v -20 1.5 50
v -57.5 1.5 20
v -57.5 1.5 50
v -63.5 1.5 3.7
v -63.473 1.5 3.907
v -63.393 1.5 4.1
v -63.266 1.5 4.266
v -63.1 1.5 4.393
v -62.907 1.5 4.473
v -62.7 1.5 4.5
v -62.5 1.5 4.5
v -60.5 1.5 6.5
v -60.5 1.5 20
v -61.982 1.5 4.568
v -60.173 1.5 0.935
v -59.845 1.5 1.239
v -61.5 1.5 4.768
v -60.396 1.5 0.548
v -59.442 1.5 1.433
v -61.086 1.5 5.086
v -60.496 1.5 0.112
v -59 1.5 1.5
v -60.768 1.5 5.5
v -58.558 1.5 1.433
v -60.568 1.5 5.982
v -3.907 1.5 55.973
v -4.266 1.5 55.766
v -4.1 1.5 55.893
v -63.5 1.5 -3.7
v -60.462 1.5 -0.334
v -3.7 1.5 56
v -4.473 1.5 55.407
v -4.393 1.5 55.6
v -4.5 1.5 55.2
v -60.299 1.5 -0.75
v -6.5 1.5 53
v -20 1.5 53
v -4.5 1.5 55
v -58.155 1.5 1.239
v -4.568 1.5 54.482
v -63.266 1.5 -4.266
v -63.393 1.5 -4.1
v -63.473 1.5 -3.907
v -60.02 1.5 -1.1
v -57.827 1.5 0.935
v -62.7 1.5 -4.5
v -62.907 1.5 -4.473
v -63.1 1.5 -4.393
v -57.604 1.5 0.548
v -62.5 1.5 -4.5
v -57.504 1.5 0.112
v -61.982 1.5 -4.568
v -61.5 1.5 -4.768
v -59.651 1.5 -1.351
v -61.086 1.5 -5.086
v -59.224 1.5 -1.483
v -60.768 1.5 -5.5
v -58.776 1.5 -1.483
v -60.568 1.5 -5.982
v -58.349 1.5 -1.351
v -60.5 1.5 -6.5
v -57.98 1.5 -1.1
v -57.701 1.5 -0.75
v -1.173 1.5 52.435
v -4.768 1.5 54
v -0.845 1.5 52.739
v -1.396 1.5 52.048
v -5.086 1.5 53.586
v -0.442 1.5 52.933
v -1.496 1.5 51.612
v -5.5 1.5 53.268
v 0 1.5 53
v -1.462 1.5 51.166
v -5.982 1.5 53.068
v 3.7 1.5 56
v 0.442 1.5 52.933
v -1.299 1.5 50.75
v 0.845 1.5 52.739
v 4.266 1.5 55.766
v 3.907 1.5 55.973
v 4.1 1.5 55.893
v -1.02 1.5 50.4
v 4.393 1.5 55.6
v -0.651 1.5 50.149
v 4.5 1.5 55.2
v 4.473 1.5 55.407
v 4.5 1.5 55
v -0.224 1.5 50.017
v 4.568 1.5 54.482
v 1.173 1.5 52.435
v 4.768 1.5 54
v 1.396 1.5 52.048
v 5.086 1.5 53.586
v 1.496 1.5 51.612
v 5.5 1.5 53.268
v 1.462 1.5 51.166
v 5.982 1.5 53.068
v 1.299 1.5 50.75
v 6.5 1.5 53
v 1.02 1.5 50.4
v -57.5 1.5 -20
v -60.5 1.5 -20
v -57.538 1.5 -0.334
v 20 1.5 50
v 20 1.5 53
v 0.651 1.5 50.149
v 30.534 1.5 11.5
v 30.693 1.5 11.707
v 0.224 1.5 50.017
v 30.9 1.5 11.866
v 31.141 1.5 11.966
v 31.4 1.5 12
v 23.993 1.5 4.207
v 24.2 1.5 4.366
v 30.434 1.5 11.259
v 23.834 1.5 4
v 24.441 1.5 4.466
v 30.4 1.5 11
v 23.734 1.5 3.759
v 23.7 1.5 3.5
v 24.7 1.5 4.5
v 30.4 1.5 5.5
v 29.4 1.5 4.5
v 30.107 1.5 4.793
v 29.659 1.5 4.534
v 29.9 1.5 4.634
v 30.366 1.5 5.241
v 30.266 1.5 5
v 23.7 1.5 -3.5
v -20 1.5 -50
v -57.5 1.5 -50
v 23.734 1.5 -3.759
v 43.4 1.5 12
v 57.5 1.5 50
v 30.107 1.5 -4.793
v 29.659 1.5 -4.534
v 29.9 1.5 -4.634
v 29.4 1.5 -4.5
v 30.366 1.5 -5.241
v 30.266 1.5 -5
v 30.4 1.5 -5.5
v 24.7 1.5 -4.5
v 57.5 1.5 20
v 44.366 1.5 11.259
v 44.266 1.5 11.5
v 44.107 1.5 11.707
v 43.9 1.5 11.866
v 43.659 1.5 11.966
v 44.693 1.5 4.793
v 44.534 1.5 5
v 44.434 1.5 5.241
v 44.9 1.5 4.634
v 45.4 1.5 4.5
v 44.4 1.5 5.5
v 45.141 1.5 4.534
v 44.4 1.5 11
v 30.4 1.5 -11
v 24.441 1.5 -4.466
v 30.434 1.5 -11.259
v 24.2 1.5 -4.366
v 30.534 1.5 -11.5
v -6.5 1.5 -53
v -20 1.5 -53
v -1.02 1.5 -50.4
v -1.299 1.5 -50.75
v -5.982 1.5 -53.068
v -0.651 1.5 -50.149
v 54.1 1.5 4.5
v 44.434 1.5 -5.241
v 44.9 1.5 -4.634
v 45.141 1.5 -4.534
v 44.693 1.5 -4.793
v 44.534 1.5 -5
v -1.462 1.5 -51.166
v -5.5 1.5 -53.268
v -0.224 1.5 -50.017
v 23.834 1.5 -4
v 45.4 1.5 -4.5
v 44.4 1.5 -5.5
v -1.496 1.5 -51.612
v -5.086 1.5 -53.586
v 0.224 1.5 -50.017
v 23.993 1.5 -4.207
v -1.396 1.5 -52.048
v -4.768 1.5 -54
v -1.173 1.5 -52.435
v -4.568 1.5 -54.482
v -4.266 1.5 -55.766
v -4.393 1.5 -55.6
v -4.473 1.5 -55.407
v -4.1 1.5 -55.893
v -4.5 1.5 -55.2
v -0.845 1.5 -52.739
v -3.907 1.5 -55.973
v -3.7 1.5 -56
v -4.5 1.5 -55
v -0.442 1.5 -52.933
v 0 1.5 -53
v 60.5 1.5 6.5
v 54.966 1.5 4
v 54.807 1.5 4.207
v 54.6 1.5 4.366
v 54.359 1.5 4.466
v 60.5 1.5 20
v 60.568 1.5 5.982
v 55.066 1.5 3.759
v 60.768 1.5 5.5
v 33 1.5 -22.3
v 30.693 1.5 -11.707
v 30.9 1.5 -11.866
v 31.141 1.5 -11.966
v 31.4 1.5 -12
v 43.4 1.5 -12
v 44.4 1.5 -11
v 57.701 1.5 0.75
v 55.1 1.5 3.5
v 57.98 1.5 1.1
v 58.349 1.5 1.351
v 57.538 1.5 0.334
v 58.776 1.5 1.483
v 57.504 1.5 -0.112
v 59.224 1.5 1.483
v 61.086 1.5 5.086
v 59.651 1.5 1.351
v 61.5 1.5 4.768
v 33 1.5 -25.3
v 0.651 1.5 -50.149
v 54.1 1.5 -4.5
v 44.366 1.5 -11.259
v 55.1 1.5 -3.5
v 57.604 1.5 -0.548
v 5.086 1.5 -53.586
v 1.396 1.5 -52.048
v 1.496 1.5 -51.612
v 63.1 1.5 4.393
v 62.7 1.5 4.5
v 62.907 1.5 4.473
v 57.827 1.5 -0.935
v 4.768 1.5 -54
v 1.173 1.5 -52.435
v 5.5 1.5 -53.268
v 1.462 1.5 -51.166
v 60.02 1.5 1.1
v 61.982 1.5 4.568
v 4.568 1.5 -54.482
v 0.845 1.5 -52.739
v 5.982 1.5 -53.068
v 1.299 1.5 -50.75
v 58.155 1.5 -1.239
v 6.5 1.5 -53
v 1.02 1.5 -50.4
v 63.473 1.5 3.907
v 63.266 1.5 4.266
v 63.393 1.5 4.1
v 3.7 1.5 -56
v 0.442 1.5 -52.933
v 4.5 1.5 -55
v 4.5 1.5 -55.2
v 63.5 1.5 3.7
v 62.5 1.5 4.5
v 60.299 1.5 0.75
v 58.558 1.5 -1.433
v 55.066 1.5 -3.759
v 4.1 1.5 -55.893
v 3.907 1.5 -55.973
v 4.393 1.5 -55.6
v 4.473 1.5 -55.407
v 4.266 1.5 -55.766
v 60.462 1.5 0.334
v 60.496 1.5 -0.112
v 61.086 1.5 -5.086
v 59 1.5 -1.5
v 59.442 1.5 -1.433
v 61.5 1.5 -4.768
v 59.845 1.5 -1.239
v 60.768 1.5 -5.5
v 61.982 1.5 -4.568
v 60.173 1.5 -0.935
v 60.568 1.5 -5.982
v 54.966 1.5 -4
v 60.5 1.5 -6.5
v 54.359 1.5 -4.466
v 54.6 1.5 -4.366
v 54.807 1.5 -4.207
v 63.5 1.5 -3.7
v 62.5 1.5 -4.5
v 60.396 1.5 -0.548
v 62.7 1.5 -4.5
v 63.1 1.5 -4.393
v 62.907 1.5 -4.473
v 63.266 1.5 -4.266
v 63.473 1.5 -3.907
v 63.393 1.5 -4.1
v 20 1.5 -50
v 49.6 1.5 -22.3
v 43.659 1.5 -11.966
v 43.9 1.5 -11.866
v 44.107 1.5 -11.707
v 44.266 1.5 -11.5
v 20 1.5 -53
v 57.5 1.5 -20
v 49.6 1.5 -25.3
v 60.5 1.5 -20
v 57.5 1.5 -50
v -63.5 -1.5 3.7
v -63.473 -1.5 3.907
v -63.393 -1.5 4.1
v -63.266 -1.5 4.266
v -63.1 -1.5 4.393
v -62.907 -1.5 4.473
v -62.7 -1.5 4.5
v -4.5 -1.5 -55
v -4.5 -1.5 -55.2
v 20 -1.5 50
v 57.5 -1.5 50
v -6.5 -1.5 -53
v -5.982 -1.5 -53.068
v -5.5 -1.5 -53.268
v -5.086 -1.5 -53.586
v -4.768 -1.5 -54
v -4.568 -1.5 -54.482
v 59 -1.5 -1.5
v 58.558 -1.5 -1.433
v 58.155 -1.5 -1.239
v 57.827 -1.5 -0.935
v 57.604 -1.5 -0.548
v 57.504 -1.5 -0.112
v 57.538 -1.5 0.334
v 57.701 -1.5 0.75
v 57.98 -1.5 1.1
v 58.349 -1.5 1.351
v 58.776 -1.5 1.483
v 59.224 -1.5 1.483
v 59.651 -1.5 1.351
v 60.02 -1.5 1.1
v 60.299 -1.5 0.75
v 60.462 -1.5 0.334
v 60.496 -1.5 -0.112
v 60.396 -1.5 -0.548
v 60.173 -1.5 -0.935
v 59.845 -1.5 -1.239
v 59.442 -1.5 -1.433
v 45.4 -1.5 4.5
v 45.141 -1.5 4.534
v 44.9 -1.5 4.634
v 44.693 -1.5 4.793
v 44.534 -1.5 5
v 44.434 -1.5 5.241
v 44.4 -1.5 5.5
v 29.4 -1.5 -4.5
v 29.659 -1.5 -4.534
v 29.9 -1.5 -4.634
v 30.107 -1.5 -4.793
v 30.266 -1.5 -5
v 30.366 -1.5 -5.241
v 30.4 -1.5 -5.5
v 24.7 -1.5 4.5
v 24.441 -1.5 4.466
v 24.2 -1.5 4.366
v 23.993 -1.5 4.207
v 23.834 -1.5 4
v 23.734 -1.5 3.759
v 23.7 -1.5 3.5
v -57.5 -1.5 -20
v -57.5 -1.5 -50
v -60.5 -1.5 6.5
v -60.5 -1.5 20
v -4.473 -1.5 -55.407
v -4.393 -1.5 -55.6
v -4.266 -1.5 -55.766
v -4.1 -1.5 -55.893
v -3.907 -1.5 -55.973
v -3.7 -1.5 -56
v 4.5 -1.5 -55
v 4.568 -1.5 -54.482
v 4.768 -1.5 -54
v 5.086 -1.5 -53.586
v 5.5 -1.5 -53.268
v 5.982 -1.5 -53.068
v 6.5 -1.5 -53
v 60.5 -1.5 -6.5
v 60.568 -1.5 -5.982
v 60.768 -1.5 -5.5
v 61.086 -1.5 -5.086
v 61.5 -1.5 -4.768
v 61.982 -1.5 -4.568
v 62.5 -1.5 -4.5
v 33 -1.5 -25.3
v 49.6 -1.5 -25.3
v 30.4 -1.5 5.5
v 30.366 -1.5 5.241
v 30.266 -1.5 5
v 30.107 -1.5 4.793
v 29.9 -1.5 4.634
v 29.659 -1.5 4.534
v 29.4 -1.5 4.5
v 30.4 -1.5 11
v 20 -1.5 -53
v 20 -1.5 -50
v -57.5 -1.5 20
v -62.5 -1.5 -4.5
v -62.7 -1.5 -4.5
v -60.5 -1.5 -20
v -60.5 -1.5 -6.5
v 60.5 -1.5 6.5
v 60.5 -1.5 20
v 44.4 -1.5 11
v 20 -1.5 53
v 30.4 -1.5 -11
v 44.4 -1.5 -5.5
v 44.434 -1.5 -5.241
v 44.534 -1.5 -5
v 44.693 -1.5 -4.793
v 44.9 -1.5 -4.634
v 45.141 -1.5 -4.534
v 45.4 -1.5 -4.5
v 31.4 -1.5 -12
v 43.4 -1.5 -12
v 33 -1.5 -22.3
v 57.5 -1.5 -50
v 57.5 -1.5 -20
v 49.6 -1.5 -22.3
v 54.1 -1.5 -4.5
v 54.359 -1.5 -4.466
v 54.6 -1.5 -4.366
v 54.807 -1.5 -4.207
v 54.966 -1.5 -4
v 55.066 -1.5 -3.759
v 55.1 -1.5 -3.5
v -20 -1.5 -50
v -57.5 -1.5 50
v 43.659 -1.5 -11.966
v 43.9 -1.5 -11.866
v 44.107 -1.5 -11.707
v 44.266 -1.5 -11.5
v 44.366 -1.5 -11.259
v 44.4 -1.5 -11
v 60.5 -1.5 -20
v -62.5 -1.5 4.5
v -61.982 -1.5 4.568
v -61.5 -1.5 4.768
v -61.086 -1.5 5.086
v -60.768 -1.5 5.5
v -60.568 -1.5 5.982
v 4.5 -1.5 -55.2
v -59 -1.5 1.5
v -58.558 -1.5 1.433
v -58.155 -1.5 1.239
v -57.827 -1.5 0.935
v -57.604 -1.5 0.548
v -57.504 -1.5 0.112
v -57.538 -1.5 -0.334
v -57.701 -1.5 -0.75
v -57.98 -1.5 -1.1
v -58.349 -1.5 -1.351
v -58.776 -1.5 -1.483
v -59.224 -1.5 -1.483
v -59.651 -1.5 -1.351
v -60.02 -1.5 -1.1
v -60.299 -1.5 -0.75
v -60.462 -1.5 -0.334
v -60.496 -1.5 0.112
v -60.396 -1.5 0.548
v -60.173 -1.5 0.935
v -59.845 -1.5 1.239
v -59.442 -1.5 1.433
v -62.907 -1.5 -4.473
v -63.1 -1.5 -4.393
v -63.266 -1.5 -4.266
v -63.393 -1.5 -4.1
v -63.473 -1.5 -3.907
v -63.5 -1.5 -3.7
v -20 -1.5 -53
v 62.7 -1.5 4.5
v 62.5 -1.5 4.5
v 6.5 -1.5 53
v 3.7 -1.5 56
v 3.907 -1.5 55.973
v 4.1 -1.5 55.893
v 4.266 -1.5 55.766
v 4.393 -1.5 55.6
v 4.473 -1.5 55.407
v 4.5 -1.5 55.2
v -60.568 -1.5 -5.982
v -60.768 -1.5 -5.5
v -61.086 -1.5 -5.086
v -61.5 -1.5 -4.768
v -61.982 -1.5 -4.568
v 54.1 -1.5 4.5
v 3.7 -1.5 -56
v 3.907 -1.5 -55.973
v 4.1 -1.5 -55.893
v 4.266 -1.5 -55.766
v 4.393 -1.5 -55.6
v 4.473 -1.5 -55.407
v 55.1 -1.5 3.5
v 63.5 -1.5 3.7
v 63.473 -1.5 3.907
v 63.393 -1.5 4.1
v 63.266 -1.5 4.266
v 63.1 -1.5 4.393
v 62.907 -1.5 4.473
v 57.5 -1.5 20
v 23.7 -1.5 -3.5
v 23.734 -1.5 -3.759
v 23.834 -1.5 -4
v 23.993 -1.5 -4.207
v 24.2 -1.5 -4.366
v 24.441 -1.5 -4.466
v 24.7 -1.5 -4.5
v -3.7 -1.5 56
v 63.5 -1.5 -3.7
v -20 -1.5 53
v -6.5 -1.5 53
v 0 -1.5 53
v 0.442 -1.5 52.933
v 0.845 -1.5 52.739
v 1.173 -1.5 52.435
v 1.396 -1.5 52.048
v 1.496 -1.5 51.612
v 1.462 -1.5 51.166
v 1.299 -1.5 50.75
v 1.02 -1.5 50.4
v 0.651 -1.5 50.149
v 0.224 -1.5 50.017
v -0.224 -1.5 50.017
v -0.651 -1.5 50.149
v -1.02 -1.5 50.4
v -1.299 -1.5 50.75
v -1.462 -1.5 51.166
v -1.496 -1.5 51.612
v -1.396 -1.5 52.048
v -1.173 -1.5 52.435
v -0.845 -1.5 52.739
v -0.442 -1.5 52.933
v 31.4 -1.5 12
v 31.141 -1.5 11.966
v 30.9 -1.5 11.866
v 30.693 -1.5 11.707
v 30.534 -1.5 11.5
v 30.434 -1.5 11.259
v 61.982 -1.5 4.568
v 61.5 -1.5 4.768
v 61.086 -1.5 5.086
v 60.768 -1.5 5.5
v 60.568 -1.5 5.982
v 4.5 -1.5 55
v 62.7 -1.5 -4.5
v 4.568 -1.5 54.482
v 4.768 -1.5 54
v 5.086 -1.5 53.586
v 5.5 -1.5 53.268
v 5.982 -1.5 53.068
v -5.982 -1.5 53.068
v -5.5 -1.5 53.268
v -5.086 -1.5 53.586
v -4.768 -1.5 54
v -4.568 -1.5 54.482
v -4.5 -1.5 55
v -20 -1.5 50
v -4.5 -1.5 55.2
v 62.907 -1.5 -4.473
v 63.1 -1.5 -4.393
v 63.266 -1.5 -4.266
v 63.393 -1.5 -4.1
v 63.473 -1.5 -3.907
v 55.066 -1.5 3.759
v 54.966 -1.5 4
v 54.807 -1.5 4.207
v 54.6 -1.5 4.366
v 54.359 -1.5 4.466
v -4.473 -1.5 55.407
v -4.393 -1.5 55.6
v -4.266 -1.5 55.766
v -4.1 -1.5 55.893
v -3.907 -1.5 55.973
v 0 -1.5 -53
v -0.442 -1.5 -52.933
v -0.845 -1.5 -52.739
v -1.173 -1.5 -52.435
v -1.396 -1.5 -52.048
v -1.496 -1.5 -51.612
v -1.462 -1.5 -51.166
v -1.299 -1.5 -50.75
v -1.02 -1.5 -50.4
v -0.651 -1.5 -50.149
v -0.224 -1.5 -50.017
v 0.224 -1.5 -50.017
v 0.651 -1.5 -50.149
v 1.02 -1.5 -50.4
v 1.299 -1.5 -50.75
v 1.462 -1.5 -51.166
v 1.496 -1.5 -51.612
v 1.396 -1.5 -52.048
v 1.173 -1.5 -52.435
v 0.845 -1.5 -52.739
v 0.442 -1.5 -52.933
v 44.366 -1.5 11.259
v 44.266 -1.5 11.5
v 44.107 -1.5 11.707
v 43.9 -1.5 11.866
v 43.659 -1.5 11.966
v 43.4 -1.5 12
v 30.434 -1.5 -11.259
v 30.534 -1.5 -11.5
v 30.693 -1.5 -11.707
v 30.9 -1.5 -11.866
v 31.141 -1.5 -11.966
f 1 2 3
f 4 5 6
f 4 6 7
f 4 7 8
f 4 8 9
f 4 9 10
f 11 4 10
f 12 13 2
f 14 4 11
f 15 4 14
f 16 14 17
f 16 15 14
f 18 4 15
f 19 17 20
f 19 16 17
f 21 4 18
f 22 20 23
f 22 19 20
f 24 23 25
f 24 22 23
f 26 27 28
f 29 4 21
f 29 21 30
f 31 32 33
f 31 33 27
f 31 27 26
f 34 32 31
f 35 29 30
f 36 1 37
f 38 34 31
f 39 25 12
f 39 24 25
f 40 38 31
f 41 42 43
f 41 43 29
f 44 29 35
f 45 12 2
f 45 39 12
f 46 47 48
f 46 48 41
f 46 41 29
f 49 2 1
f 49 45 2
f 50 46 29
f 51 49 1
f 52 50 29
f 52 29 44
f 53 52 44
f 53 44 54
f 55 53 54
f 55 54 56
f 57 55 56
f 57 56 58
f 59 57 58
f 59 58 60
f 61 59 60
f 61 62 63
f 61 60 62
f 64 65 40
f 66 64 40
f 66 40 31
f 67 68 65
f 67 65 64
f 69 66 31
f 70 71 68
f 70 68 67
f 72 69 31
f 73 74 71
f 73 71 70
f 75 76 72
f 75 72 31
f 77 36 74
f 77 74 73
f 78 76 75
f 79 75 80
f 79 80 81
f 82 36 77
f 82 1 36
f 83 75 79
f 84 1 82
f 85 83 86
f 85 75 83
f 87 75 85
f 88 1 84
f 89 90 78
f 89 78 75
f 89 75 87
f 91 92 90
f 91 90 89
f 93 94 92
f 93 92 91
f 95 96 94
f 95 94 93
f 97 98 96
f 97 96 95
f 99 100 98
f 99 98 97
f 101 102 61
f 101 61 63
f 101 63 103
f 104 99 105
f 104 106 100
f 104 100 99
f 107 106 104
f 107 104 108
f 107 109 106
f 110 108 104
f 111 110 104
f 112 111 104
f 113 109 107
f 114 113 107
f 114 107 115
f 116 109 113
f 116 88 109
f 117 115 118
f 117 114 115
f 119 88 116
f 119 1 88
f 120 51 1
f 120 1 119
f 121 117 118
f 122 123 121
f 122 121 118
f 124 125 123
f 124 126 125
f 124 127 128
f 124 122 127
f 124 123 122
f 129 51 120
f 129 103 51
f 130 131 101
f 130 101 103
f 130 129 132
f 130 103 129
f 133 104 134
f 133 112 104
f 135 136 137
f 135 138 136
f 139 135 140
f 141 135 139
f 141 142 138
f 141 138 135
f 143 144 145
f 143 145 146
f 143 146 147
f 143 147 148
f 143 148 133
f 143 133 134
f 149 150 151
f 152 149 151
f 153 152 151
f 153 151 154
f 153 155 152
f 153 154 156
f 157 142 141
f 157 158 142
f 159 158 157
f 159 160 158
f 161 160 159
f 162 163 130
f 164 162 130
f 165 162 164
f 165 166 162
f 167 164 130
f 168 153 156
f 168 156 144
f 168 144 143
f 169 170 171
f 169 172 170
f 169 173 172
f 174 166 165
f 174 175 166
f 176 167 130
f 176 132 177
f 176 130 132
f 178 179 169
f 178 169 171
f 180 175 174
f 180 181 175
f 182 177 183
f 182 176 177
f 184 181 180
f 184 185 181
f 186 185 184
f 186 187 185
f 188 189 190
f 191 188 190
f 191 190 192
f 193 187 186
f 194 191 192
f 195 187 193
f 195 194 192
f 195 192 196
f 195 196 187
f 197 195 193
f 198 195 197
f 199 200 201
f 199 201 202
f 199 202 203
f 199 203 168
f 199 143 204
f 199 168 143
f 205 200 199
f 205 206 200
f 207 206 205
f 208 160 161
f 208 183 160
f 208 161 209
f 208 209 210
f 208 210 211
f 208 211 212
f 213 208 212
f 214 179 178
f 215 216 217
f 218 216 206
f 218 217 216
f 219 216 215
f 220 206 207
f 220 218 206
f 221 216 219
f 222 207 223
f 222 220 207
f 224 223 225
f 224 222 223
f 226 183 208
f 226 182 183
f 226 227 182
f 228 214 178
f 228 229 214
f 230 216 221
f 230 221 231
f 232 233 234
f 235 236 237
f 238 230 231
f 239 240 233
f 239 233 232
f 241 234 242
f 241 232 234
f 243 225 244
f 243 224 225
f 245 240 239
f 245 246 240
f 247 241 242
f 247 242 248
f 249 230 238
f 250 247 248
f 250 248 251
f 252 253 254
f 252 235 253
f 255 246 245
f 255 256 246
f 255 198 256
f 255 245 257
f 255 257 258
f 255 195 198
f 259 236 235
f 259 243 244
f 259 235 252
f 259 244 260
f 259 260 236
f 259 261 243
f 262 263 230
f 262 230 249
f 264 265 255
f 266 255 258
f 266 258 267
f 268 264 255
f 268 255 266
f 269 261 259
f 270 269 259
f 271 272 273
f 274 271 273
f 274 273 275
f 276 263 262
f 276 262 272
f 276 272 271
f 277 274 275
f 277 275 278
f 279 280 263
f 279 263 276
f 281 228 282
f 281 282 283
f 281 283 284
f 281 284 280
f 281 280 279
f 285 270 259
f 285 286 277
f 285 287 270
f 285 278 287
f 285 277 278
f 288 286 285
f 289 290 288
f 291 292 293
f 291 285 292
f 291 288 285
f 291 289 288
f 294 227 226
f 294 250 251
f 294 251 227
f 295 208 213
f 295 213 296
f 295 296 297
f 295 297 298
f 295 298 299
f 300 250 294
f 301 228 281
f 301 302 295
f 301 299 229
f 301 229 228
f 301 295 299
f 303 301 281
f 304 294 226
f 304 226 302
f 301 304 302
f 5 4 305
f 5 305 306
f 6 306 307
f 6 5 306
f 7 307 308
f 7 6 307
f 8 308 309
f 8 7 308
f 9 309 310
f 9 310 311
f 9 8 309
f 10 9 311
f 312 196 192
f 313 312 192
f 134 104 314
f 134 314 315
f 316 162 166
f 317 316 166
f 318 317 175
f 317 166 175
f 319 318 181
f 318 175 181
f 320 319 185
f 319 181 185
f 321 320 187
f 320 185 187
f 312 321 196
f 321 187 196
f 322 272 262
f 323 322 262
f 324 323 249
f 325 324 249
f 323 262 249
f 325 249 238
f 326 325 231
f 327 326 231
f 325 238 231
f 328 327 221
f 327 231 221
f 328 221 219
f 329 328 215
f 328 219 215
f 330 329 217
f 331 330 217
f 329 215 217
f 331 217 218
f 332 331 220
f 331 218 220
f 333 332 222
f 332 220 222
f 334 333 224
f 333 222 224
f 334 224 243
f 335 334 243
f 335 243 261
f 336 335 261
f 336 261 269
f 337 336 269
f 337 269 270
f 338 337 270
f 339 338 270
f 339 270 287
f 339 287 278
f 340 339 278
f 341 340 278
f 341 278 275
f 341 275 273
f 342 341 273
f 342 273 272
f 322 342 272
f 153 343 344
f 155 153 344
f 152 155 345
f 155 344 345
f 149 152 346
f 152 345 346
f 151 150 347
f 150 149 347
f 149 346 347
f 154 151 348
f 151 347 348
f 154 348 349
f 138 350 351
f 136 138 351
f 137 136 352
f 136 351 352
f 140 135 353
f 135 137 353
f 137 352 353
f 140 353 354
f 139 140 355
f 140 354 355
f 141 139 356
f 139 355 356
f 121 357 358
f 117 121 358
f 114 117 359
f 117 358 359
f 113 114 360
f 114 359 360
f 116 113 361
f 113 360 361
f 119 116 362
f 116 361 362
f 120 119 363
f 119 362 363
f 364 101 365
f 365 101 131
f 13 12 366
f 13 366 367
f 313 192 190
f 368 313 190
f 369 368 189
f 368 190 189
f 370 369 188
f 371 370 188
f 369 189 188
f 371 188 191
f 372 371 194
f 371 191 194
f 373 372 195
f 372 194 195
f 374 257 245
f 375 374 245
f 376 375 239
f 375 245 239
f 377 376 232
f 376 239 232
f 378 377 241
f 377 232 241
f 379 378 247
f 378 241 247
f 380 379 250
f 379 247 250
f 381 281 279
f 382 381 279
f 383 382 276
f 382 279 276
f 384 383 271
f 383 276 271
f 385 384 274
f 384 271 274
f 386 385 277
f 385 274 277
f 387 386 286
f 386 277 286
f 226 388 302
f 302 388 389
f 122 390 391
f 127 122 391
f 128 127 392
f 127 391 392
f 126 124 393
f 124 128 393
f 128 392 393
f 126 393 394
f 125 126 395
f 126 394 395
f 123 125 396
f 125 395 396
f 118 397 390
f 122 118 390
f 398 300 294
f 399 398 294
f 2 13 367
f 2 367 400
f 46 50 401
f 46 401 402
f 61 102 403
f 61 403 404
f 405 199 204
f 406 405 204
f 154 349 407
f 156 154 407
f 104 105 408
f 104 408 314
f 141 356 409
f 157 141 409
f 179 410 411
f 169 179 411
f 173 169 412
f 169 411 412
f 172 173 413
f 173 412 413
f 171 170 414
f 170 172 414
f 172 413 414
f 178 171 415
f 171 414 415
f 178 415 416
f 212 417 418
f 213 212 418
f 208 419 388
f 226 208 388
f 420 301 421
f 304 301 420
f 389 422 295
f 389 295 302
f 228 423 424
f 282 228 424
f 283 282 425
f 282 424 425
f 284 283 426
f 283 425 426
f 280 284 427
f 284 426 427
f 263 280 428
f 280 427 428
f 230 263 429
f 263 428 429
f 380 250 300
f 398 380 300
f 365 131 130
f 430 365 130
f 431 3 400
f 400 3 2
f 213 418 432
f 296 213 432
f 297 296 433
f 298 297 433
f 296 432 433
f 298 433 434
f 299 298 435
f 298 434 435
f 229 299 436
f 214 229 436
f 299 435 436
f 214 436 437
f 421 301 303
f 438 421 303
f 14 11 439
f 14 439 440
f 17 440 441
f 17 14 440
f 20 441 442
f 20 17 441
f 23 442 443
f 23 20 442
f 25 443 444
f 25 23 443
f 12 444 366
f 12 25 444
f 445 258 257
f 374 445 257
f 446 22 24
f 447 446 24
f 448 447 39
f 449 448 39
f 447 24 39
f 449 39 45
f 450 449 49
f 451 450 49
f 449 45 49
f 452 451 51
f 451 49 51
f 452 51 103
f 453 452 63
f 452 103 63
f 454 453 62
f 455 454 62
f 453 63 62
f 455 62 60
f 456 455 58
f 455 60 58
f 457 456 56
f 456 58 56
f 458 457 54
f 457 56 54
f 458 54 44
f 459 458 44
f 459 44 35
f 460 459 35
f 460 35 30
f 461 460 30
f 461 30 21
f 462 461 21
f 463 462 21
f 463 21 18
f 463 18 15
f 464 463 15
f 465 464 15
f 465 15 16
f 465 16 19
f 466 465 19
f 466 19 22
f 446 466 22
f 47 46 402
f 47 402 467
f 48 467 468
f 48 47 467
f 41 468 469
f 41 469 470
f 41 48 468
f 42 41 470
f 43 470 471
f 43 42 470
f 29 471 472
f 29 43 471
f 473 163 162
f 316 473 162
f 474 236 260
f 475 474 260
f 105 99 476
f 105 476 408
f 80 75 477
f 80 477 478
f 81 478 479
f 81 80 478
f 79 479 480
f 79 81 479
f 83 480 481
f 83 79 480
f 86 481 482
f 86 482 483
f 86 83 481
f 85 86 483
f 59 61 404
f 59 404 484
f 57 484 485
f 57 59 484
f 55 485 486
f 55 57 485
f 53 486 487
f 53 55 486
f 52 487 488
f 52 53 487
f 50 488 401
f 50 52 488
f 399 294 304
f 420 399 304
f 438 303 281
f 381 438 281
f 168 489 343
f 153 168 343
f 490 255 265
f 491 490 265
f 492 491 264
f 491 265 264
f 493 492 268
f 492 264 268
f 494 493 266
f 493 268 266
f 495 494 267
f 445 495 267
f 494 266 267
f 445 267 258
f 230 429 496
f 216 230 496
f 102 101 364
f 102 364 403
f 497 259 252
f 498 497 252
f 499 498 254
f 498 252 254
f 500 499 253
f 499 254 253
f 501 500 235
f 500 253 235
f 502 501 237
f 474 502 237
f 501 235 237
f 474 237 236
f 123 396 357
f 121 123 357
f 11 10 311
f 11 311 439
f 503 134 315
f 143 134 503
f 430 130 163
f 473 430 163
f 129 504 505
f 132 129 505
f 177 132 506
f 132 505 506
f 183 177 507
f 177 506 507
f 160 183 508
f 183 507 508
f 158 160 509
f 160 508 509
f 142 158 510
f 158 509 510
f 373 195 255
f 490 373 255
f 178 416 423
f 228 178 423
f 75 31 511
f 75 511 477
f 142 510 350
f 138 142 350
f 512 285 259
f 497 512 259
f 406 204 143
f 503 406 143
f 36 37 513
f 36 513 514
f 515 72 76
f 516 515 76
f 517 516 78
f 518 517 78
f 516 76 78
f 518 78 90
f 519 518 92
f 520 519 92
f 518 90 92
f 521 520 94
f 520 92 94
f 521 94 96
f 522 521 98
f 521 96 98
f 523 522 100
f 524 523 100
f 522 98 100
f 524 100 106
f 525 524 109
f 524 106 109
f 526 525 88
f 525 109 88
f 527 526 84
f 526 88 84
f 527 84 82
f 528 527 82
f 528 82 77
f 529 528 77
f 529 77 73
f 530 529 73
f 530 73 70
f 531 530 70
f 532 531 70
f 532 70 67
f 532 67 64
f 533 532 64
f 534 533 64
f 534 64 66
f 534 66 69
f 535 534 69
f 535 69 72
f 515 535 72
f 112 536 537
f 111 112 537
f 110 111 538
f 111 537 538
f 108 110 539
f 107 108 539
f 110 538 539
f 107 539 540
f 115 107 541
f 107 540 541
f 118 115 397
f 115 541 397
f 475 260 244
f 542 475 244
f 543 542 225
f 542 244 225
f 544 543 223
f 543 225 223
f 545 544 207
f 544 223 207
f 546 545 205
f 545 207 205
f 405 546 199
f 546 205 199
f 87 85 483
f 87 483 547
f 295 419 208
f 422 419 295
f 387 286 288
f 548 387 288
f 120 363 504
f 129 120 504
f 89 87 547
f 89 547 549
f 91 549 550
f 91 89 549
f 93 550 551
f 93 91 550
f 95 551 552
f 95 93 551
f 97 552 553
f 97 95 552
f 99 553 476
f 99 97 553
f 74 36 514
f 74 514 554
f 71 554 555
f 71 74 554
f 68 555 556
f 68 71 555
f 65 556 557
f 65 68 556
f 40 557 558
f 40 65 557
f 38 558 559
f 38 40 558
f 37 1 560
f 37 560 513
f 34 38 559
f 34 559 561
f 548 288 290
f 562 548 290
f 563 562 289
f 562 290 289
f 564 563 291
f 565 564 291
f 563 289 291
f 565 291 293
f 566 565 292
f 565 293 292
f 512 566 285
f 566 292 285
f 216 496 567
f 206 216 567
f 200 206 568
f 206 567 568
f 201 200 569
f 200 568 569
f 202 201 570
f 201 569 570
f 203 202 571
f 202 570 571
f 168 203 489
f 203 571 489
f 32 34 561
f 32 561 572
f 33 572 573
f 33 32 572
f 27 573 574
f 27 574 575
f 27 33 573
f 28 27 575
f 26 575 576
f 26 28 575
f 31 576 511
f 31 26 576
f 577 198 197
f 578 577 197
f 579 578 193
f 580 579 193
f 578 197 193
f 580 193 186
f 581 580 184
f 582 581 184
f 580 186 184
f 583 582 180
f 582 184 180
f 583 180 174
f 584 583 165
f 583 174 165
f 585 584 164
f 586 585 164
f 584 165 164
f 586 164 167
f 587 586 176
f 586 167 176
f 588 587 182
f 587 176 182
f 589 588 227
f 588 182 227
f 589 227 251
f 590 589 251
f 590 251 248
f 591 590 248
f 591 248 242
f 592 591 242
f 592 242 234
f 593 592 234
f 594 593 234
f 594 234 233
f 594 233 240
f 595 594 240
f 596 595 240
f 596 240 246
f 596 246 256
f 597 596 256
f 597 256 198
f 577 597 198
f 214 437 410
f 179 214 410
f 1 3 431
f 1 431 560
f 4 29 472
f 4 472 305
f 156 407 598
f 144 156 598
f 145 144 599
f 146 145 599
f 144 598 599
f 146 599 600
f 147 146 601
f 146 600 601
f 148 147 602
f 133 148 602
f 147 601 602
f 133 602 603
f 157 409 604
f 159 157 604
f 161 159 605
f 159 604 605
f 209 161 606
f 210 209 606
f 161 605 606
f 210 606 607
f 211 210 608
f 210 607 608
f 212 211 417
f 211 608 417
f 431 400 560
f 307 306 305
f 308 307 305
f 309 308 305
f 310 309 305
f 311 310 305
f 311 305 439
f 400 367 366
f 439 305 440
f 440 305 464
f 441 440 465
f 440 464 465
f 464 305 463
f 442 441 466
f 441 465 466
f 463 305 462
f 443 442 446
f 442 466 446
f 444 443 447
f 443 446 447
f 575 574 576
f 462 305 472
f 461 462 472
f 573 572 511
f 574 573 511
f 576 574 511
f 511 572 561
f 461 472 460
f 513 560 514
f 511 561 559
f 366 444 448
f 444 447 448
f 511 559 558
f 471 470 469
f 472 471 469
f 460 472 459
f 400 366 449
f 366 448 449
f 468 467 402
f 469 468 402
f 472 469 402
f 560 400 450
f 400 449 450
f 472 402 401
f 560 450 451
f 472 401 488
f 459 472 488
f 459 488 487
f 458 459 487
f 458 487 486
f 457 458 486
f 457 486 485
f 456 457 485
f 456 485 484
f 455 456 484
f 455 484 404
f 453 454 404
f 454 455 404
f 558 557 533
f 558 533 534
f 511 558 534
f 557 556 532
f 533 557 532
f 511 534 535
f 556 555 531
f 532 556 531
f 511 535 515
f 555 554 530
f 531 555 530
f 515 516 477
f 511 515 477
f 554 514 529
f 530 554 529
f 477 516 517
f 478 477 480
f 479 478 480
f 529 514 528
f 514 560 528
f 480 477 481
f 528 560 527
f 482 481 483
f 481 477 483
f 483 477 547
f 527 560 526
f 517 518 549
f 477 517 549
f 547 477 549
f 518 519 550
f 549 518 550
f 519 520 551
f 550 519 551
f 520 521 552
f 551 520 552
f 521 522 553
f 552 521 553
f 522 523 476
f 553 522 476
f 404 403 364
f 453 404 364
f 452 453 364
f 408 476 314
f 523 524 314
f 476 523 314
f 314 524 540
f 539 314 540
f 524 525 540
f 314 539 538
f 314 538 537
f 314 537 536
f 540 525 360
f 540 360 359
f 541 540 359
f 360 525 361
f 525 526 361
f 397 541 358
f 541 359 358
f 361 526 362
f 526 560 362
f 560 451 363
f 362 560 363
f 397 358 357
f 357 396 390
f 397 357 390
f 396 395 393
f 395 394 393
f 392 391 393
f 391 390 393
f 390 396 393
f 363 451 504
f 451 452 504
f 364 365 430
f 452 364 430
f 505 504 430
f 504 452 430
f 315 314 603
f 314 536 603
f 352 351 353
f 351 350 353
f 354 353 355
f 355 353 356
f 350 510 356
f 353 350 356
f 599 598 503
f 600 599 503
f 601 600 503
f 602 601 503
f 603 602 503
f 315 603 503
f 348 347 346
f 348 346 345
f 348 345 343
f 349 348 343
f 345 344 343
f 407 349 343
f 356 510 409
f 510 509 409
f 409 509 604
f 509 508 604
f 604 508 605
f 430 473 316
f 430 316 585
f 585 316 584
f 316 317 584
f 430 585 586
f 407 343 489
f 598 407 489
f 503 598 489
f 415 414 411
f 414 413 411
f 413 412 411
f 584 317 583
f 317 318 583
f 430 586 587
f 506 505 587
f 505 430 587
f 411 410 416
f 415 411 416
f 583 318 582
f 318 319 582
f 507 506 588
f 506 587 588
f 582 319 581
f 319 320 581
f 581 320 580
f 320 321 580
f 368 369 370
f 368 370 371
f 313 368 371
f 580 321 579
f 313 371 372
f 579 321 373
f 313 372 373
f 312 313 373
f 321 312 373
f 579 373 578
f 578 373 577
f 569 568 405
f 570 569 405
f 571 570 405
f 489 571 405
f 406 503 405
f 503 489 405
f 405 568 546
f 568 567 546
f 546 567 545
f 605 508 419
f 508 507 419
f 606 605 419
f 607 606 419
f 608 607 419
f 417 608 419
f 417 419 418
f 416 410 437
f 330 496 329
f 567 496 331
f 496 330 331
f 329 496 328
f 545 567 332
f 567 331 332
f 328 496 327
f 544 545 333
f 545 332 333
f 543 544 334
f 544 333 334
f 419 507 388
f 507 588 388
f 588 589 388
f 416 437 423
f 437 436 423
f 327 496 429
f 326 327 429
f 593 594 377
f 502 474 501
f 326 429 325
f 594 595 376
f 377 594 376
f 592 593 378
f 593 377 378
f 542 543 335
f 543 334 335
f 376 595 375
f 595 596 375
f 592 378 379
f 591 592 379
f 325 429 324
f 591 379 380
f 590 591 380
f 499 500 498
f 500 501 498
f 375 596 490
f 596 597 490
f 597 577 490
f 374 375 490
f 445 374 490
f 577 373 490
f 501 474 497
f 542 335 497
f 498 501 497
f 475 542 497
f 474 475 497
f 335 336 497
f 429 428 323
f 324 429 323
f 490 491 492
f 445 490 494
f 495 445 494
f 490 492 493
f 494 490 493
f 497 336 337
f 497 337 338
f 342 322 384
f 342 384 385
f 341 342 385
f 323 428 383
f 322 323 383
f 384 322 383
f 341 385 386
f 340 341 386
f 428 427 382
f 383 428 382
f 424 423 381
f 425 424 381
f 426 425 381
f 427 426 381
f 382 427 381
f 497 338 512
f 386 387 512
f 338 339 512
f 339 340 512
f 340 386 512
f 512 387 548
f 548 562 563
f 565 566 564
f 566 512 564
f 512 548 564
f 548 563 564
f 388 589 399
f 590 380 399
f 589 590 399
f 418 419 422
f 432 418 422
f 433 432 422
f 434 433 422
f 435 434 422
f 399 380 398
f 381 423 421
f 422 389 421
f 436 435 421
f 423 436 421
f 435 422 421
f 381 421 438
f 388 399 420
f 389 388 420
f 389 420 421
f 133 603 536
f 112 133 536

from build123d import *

# Parameters (mm, degrees)
ESBO_O1_W                = 115
ESBO_O1_H                = 100
RESSALTO_EXTRUS_O1_DEPTH = 1.5
RESSALTO_EXTRUS_O2_DEPTH = 3
ESBO_O2_R                = 1.5
CORTE_EXTRUS_O1_DEPTH    = 85.718652019
CUT_EXTRUDE3_DEPTH       = 85.678804904
CUT_EXTRUDE3_DEPTH_BACK  = 85.678804904
SKETCH2_W                = 16.6
SKETCH2_H                = 3


with BuildPart() as part:
    # Esboço1 → Ressalto-extrusão1 (new, symmetric)
    with BuildSketch(Plane(origin=(0, 0, 0), x_dir=(1, 0, 0), z_dir=(0, 1, 0))):
        Rectangle(ESBO_O1_W, ESBO_O1_H)
    extrude(amount=RESSALTO_EXTRUS_O1_DEPTH, both=True)

    # Esboço4 → Ressalto-extrusão2 (add, through all)
    with BuildSketch(Plane(origin=(0, 1.5, 0), x_dir=(1, 0, 0), z_dir=(0, 1, 0))):
        with BuildLine():
            Line((6.5, 53), (20, 53))
            Line((20, 53), (20, 50))
            Line((20, 50), (-20, 50))
            Line((-20, 50), (-20, 53))
            Line((-20, 53), (-6.5, 53))
            ThreePointArc((-6.5, 53), (-5.085786438, 53.585786438), (-4.5, 55))
            Line((-4.5, 55), (-4.5, 55.2))
            ThreePointArc((-4.5, 55.2), (-4.265685425, 55.765685425), (-3.7, 56))
            Line((-3.7, 56), (3.7, 56))
            ThreePointArc((3.7, 56), (4.265685425, 55.765685425), (4.5, 55.2))
            Line((4.5, 55.2), (4.5, 55))
            ThreePointArc((4.5, 55), (5.085786438, 53.585786438), (6.5, 53))
        make_face()
        with BuildLine():
            Line((-63.5, 3.7), (-63.5, -3.7))
            ThreePointArc((-63.5, -3.7), (-63.265685425, -4.265685425), (-62.7, -4.5))
            Line((-62.7, -4.5), (-62.5, -4.5))
            ThreePointArc((-62.5, -4.5), (-61.085786438, -5.085786438), (-60.5, -6.5))
            Line((-60.5, -6.5), (-60.5, -20))
            Line((-60.5, -20), (-57.5, -20))
            Line((-57.5, -20), (-57.5, 20))
            Line((-57.5, 20), (-60.5, 20))
            Line((-60.5, 20), (-60.5, 6.5))
            ThreePointArc((-60.5, 6.5), (-61.085786438, 5.085786438), (-62.5, 4.5))
            Line((-62.5, 4.5), (-62.7, 4.5))
            ThreePointArc((-62.7, 4.5), (-63.265685425, 4.265685425), (-63.5, 3.7))
        make_face()
        with BuildLine():
            Line((4.5, -55.2), (4.5, -55))
            ThreePointArc((4.5, -55), (5.085786438, -53.585786438), (6.5, -53))
            Line((6.5, -53), (20, -53))
            Line((20, -53), (20, -50))
            Line((20, -50), (-20, -50))
            Line((-20, -50), (-20, -53))
            Line((-20, -53), (-6.5, -53))
            ThreePointArc((-6.5, -53), (-5.085786438, -53.585786438), (-4.5, -55))
            Line((-4.5, -55), (-4.5, -55.2))
            ThreePointArc((-4.5, -55.2), (-4.265685425, -55.765685425), (-3.7, -56))
            Line((-3.7, -56), (3.7, -56))
            ThreePointArc((3.7, -56), (4.265685425, -55.765685425), (4.5, -55.2))
        make_face()
        with BuildLine():
            Line((57.5, 20), (60.5, 20))
            Line((60.5, 20), (60.5, 6.5))
            ThreePointArc((60.5, 6.5), (61.085786438, 5.085786438), (62.5, 4.5))
            Line((62.5, 4.5), (62.7, 4.5))
            ThreePointArc((62.7, 4.5), (63.265685425, 4.265685425), (63.5, 3.7))
            Line((63.5, 3.7), (63.5, -3.7))
            ThreePointArc((63.5, -3.7), (63.265685425, -4.265685425), (62.7, -4.5))
            Line((62.7, -4.5), (62.5, -4.5))
            ThreePointArc((62.5, -4.5), (61.085786438, -5.085786438), (60.5, -6.5))
            Line((60.5, -6.5), (60.5, -20))
            Line((60.5, -20), (57.5, -20))
            Line((57.5, -20), (57.5, 20))
        make_face()
    extrude(amount=-RESSALTO_EXTRUS_O2_DEPTH)

    # Esboço2 → Corte-extrusão1 (cut, through all)
    with BuildSketch(Plane(origin=(0, 1.5, 0), x_dir=(1, 0, 0), z_dir=(0, 1, 0))):
        with Locations(Location((0, -51.5, 0), (0, 0, 270))):
            Circle(ESBO_O2_R)
        with Locations(Location((0, 51.5, 0), (0, 0, 90))):
            Circle(ESBO_O2_R)
        with Locations(Location((59, 0, 0), (0, 0, 90))):
            Circle(ESBO_O2_R)
        with Locations(Location((-59, 0, 0), (0, 0, 270))):
            Circle(ESBO_O2_R)
    extrude(amount=-CORTE_EXTRUS_O1_DEPTH, mode=Mode.SUBTRACT)

    # Sketch2 → Cut-Extrude3 (cut, two sides: drawn at the far end of the back side and taken through both)
    with BuildSketch(Plane(origin=(0, 0, 0), x_dir=(1, 0, 0), z_dir=(0, 1, 0)).offset(-CUT_EXTRUDE3_DEPTH_BACK)):
        with BuildLine():
            Line((24.7, 4.5), (29.4, 4.5))
            ThreePointArc((29.4, 4.5), (30.107106781, 4.792893219), (30.4, 5.5))
            Line((30.4, 5.5), (30.4, 11))
            ThreePointArc((30.4, 11), (30.692893219, 11.707106781), (31.4, 12))
            Line((31.4, 12), (43.4, 12))
            ThreePointArc((43.4, 12), (44.107106781, 11.707106781), (44.4, 11))
            Line((44.4, 11), (44.4, 5.5))
            ThreePointArc((44.4, 5.5), (44.692893219, 4.792893219), (45.4, 4.5))
            Line((45.4, 4.5), (54.1, 4.5))
            ThreePointArc((54.1, 4.5), (54.807106781, 4.207106781), (55.1, 3.5))
            Line((55.1, 3.5), (55.1, -3.5))
            ThreePointArc((55.1, -3.5), (54.807106781, -4.207106781), (54.1, -4.5))
            Line((54.1, -4.5), (45.4, -4.5))
            ThreePointArc((45.4, -4.5), (44.692893219, -4.792893219), (44.4, -5.5))
            Line((44.4, -5.5), (44.4, -11))
            ThreePointArc((44.4, -11), (44.107106781, -11.707106781), (43.4, -12))
            Line((43.4, -12), (31.4, -12))
            ThreePointArc((31.4, -12), (30.692893219, -11.707106781), (30.4, -11))
            Line((30.4, -11), (30.4, -5.5))
            ThreePointArc((30.4, -5.5), (30.107106781, -4.792893219), (29.4, -4.5))
            Line((29.4, -4.5), (24.7, -4.5))
            ThreePointArc((24.7, -4.5), (23.992893219, -4.207106781), (23.7, -3.5))
            Line((23.7, -3.5), (23.7, 3.5))
            ThreePointArc((23.7, 3.5), (23.992893219, 4.207106781), (24.7, 4.5))
        make_face()
        with Locations((41.3, 23.8)):
            Rectangle(SKETCH2_W, SKETCH2_H)
    extrude(amount=CUT_EXTRUDE3_DEPTH + CUT_EXTRUDE3_DEPTH_BACK, mode=Mode.SUBTRACT)


solid = part.part
